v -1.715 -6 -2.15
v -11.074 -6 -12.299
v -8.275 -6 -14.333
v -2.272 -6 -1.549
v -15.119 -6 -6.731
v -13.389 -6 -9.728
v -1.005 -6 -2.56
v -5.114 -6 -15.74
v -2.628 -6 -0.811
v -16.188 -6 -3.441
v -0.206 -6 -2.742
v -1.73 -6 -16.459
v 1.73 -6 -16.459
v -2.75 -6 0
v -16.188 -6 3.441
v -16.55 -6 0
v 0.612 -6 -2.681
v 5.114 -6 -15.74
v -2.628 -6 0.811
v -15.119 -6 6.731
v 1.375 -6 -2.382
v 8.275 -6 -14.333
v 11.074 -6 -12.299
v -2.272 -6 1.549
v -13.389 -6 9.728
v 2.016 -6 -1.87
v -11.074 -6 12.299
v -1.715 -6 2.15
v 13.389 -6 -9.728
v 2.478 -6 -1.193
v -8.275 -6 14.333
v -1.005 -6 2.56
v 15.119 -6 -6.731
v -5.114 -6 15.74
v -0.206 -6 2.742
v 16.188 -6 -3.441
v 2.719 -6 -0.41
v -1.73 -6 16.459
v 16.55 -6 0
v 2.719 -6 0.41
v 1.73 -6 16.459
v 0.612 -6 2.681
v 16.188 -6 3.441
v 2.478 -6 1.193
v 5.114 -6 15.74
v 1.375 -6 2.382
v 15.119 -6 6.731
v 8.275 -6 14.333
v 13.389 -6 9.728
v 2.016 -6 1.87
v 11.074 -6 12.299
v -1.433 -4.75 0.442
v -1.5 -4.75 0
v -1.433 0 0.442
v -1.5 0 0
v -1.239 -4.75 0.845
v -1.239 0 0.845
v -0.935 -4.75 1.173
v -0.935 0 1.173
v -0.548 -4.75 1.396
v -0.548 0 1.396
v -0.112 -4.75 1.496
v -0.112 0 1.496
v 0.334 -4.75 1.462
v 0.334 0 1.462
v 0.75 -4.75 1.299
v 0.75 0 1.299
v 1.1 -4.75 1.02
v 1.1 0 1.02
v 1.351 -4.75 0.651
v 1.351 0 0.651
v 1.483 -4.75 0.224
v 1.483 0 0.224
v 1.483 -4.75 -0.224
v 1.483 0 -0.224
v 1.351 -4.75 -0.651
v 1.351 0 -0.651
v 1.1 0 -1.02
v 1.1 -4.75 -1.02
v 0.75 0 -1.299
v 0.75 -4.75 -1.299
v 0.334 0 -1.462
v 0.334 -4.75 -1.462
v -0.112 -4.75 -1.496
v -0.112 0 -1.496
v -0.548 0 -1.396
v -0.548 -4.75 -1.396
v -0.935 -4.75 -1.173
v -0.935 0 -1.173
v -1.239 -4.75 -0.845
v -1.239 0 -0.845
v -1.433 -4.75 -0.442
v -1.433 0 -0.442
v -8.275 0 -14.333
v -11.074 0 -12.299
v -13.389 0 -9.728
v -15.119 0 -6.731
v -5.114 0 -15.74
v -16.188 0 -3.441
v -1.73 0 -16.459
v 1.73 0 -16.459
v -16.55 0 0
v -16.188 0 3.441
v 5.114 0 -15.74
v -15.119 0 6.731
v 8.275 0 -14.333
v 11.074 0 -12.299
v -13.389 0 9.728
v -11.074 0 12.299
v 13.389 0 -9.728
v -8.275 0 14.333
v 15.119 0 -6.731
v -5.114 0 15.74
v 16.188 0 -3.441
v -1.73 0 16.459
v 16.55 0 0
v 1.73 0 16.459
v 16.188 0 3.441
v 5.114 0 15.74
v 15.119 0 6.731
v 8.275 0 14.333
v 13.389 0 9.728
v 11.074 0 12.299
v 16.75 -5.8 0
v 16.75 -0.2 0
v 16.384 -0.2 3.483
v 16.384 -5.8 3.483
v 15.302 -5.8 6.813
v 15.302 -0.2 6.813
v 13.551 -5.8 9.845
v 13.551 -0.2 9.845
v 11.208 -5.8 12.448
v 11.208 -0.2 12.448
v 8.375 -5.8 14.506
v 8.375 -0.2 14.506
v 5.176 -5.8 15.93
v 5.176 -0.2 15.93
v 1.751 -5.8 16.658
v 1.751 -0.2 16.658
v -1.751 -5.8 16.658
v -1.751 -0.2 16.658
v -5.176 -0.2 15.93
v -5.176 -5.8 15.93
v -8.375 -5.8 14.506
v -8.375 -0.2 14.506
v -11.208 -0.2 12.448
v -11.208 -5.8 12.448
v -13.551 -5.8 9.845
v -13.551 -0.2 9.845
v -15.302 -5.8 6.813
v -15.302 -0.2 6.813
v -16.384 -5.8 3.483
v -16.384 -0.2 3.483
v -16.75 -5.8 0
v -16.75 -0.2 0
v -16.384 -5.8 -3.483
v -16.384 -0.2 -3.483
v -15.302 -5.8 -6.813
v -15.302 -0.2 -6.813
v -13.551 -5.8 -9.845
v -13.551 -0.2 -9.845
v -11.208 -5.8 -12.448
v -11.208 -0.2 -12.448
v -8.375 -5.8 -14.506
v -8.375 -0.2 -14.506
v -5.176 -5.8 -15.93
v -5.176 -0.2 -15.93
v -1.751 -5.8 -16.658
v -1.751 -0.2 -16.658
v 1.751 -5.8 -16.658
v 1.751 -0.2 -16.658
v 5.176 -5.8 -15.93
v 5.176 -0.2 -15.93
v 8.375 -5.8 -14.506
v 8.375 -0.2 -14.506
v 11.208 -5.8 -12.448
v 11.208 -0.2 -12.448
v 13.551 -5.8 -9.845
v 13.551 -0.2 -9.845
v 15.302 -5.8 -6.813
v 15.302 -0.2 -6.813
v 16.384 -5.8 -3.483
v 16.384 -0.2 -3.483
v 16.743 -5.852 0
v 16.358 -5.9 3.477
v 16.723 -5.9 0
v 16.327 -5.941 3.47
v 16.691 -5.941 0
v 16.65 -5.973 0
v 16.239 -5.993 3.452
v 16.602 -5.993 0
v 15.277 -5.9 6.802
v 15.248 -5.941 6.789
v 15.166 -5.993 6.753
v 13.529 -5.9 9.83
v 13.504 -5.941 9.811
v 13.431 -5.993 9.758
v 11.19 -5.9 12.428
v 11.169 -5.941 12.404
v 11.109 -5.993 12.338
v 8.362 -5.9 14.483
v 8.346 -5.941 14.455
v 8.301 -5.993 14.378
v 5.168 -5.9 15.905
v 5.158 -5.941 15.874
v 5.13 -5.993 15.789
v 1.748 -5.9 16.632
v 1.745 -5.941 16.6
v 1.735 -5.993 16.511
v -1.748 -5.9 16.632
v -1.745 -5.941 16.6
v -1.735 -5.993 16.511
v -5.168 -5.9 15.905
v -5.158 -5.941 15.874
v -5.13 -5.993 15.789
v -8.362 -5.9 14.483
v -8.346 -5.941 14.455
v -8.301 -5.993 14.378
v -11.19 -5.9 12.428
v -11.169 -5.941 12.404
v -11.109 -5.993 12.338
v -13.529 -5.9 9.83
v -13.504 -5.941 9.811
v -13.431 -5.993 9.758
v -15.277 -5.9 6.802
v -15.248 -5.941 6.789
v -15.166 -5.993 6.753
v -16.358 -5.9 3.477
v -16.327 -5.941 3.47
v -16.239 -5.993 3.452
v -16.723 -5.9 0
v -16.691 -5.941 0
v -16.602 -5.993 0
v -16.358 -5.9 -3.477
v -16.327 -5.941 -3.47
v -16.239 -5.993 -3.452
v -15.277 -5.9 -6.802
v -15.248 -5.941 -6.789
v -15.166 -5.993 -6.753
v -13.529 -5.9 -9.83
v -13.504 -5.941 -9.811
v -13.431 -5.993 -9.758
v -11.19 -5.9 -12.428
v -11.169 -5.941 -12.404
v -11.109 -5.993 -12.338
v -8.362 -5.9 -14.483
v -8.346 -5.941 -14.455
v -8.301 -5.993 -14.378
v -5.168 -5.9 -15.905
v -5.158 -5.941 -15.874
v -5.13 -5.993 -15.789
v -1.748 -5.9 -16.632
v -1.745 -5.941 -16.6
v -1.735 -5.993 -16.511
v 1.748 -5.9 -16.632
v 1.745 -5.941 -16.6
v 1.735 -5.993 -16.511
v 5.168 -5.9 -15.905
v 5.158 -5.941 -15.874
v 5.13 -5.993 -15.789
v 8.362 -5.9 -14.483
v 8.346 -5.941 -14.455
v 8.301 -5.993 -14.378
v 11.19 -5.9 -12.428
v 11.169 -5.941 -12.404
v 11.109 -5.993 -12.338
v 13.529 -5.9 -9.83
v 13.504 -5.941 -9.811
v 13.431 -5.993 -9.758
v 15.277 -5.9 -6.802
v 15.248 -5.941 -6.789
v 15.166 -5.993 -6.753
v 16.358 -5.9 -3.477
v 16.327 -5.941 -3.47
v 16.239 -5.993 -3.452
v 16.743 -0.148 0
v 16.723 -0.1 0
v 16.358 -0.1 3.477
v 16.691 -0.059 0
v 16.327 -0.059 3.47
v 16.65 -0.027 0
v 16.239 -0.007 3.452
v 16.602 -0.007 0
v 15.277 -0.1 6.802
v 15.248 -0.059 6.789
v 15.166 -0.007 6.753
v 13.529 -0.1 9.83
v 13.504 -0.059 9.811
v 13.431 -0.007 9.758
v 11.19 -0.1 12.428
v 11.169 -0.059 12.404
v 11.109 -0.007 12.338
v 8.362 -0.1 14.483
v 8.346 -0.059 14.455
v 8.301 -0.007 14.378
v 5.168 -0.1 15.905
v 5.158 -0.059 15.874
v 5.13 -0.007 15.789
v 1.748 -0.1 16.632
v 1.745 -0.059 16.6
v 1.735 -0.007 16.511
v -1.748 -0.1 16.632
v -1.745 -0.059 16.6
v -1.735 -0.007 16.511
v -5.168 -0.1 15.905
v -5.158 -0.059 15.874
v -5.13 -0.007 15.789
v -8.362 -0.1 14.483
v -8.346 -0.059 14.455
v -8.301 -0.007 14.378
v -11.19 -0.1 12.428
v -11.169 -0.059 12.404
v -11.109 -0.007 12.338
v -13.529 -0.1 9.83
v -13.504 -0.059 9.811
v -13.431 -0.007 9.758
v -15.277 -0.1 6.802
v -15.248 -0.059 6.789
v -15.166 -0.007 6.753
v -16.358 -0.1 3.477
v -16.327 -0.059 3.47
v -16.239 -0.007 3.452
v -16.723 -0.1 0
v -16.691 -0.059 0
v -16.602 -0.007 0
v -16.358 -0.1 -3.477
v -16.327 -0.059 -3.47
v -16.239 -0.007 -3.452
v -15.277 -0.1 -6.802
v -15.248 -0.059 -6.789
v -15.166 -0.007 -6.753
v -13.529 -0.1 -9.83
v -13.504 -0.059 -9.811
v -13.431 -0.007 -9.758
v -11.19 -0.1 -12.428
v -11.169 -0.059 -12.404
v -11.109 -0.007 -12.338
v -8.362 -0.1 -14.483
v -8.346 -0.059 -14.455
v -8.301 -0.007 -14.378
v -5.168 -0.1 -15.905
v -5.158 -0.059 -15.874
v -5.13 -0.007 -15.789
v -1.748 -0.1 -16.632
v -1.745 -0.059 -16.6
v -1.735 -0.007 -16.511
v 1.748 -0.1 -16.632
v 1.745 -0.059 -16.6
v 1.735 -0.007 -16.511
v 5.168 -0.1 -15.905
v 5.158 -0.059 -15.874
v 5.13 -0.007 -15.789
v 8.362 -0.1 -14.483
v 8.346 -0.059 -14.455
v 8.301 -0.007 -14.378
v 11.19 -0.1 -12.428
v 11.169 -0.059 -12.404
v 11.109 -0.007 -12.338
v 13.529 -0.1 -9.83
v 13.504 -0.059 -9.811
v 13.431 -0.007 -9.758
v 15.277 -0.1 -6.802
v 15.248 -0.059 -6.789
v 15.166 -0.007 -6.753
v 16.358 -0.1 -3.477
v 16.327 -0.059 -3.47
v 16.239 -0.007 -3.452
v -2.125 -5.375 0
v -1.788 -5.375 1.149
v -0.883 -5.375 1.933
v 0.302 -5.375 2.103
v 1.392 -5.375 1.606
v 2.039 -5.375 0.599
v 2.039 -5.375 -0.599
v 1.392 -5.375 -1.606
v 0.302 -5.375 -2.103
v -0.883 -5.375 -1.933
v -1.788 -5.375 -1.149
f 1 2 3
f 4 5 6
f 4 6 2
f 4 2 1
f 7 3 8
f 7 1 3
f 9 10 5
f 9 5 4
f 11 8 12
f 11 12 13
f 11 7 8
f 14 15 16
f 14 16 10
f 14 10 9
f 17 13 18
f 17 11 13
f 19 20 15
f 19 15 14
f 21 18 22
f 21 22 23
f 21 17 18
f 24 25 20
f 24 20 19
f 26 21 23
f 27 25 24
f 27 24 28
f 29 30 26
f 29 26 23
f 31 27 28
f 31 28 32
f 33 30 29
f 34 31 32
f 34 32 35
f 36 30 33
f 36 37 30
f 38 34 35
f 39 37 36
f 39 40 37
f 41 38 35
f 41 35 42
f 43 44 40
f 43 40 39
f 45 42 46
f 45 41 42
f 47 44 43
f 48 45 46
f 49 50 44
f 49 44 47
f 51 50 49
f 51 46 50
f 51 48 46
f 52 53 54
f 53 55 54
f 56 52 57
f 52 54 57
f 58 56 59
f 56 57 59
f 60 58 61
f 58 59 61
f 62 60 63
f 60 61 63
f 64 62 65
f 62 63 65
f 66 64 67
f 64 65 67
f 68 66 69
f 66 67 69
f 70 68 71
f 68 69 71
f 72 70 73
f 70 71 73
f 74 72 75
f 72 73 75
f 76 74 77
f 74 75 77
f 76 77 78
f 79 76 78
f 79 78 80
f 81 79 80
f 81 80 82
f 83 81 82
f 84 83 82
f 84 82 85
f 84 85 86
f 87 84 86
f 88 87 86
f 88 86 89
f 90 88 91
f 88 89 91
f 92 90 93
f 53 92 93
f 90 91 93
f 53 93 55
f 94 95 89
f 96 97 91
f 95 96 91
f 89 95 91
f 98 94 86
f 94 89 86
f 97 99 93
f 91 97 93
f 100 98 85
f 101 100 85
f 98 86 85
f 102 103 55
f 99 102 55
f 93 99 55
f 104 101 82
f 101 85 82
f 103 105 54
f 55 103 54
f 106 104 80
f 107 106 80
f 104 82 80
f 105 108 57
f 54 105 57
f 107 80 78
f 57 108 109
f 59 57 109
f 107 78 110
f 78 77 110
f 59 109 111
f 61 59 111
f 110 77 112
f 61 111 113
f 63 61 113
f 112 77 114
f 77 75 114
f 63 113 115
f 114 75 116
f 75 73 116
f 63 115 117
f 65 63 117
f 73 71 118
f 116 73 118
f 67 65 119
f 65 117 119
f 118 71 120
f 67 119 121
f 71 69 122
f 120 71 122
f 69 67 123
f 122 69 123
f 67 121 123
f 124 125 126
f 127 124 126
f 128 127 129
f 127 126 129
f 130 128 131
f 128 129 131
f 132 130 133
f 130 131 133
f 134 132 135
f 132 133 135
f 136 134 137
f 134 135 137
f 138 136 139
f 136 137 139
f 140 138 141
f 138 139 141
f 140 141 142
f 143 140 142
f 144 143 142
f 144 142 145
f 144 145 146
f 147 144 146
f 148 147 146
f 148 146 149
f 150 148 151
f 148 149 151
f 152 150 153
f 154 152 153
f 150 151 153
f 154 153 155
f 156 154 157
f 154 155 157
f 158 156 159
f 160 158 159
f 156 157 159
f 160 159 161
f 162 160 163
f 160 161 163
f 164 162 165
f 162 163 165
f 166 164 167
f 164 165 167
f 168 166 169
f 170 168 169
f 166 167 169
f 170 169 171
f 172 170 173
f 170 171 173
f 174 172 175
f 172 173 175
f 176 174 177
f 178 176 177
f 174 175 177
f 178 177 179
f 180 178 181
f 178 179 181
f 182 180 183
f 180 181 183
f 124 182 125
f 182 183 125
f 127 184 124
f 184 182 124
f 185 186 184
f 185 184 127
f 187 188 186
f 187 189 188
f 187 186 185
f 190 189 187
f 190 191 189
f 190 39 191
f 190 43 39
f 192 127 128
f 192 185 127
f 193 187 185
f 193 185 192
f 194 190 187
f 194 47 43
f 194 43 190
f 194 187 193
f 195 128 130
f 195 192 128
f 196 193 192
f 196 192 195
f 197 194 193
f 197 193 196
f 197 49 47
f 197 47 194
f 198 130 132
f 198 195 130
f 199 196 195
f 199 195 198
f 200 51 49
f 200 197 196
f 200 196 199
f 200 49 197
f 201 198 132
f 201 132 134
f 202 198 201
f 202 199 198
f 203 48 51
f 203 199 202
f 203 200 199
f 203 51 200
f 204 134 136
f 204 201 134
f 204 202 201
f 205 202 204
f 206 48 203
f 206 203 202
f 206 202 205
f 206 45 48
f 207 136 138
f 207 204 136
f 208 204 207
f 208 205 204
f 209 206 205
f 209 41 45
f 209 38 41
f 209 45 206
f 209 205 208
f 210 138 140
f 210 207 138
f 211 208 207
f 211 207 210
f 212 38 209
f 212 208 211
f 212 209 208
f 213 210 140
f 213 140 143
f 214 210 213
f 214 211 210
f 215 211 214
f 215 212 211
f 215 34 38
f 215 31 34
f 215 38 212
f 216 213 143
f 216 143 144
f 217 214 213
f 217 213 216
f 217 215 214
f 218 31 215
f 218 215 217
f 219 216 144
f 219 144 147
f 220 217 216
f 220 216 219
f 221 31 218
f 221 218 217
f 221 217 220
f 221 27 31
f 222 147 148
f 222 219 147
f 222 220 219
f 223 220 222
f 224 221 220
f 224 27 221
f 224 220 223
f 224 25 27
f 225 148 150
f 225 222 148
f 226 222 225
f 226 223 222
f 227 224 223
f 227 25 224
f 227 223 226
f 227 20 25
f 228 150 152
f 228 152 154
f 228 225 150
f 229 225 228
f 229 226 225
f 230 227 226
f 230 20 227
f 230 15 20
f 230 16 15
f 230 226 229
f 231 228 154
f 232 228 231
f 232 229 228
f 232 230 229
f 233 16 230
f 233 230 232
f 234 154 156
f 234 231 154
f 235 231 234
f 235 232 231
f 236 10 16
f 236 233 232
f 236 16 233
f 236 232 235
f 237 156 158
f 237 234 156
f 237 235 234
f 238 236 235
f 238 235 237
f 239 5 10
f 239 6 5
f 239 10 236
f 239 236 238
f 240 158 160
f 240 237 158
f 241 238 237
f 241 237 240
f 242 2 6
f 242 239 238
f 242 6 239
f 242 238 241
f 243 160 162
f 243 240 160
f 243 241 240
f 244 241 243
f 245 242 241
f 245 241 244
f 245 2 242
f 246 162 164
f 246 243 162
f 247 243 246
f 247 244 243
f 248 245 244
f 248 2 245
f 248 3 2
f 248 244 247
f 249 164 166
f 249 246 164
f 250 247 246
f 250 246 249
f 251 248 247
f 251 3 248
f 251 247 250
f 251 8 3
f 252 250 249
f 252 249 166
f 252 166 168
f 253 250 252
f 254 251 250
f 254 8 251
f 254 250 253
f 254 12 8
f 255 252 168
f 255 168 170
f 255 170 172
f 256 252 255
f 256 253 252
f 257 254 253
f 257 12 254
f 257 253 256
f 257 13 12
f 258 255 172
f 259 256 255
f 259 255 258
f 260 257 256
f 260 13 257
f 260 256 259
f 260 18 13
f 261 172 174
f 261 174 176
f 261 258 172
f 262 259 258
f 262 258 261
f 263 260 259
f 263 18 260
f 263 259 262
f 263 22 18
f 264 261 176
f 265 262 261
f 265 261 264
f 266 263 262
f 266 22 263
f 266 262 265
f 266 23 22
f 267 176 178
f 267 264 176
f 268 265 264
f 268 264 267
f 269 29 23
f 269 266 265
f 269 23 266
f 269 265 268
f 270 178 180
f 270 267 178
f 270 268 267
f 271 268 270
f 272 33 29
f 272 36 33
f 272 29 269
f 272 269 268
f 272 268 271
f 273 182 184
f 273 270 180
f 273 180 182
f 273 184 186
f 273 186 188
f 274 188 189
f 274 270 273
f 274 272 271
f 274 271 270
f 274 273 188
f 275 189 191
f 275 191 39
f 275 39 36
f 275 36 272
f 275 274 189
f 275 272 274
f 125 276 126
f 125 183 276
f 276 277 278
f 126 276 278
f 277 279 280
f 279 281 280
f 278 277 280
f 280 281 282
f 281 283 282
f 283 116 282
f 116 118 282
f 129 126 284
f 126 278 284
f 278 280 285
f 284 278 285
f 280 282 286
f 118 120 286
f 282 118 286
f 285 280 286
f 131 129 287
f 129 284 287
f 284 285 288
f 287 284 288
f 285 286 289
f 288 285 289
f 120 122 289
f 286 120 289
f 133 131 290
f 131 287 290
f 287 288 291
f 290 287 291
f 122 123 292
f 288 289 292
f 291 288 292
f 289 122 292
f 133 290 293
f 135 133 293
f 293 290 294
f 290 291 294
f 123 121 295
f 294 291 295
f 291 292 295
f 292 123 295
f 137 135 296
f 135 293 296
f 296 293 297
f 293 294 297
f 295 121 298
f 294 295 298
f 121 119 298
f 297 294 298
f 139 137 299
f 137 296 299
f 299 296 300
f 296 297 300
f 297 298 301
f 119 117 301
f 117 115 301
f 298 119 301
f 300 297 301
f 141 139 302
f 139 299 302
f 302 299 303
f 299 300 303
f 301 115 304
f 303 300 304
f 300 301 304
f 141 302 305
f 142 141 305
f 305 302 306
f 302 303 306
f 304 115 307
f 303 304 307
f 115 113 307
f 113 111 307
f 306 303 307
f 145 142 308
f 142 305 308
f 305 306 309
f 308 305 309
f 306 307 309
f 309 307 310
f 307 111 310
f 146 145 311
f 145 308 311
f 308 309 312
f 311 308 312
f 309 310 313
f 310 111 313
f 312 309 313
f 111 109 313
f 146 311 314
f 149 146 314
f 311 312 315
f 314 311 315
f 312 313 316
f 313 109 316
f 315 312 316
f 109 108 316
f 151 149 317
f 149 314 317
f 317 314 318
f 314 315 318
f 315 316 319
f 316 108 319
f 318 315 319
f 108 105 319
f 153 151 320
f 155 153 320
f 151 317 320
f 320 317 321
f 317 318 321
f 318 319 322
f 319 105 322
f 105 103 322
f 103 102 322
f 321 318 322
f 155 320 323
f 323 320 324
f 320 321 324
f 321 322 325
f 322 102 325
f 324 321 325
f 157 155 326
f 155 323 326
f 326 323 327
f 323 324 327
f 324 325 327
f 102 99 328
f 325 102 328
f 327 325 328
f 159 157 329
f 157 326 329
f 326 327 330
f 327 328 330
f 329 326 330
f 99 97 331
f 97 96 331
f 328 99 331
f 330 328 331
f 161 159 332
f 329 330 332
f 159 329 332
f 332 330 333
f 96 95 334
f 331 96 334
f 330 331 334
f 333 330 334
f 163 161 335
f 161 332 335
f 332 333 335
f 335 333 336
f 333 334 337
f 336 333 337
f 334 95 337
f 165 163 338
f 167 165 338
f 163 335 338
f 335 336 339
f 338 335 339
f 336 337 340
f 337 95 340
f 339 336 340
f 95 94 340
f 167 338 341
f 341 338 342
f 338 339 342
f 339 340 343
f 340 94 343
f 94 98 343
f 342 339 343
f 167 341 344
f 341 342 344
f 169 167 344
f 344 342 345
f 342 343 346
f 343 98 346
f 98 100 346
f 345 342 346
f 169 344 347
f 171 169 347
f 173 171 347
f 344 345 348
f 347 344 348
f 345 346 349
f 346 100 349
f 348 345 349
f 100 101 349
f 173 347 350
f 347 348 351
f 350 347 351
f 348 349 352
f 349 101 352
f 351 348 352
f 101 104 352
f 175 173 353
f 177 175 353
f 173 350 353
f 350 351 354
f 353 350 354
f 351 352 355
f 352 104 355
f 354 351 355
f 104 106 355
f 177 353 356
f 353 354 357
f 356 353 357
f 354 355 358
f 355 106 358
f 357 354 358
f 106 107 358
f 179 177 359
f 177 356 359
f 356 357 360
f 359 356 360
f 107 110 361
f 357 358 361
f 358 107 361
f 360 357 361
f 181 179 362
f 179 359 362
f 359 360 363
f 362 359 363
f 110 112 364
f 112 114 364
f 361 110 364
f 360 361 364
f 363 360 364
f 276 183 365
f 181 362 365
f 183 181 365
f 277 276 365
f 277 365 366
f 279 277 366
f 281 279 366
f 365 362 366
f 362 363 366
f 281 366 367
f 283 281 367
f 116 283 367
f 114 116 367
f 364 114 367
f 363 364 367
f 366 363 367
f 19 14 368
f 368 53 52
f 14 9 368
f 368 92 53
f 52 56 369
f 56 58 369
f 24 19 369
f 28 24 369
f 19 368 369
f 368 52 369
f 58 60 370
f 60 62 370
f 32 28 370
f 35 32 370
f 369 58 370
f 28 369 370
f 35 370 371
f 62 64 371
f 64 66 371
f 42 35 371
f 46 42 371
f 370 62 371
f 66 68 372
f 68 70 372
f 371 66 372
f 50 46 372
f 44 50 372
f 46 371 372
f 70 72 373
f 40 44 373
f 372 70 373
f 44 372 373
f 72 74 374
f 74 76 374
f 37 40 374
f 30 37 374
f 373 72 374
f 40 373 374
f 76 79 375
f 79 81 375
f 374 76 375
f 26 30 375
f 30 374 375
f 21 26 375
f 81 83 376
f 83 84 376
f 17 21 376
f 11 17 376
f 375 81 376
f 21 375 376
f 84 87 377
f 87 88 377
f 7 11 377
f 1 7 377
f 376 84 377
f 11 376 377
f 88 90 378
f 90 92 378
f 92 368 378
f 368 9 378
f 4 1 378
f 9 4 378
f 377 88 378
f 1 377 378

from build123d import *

# Parameters (mm, degrees)
F0_R           = 16.75
F1_DEPTH       = 6
F3_D           = 3
F3_CSINK_D     = 5.5
F3_CSINK_ANGLE = 90
F4_R           = 0.2


with BuildPart() as f1:
    # F0 (on Front) → F1 (new body)
    with BuildSketch(Plane.XZ):
        Circle(F0_R)
    extrude(amount=F1_DEPTH)

    # F3 (through all)
    with Locations(Plane.XZ.offset(6)):
        with Locations((0, 0)):
            CounterSinkHole(F3_D / 2, F3_CSINK_D / 2, counter_sink_angle=F3_CSINK_ANGLE)

    # F4
    f4_edges = [f1.edges().sort_by_distance(p)[0] for p in [
        (-16.75, -6, 0),
        (-16.75, 0, 0),
    ]]
    fillet(f4_edges, radius=F4_R)


solid = f1.part
